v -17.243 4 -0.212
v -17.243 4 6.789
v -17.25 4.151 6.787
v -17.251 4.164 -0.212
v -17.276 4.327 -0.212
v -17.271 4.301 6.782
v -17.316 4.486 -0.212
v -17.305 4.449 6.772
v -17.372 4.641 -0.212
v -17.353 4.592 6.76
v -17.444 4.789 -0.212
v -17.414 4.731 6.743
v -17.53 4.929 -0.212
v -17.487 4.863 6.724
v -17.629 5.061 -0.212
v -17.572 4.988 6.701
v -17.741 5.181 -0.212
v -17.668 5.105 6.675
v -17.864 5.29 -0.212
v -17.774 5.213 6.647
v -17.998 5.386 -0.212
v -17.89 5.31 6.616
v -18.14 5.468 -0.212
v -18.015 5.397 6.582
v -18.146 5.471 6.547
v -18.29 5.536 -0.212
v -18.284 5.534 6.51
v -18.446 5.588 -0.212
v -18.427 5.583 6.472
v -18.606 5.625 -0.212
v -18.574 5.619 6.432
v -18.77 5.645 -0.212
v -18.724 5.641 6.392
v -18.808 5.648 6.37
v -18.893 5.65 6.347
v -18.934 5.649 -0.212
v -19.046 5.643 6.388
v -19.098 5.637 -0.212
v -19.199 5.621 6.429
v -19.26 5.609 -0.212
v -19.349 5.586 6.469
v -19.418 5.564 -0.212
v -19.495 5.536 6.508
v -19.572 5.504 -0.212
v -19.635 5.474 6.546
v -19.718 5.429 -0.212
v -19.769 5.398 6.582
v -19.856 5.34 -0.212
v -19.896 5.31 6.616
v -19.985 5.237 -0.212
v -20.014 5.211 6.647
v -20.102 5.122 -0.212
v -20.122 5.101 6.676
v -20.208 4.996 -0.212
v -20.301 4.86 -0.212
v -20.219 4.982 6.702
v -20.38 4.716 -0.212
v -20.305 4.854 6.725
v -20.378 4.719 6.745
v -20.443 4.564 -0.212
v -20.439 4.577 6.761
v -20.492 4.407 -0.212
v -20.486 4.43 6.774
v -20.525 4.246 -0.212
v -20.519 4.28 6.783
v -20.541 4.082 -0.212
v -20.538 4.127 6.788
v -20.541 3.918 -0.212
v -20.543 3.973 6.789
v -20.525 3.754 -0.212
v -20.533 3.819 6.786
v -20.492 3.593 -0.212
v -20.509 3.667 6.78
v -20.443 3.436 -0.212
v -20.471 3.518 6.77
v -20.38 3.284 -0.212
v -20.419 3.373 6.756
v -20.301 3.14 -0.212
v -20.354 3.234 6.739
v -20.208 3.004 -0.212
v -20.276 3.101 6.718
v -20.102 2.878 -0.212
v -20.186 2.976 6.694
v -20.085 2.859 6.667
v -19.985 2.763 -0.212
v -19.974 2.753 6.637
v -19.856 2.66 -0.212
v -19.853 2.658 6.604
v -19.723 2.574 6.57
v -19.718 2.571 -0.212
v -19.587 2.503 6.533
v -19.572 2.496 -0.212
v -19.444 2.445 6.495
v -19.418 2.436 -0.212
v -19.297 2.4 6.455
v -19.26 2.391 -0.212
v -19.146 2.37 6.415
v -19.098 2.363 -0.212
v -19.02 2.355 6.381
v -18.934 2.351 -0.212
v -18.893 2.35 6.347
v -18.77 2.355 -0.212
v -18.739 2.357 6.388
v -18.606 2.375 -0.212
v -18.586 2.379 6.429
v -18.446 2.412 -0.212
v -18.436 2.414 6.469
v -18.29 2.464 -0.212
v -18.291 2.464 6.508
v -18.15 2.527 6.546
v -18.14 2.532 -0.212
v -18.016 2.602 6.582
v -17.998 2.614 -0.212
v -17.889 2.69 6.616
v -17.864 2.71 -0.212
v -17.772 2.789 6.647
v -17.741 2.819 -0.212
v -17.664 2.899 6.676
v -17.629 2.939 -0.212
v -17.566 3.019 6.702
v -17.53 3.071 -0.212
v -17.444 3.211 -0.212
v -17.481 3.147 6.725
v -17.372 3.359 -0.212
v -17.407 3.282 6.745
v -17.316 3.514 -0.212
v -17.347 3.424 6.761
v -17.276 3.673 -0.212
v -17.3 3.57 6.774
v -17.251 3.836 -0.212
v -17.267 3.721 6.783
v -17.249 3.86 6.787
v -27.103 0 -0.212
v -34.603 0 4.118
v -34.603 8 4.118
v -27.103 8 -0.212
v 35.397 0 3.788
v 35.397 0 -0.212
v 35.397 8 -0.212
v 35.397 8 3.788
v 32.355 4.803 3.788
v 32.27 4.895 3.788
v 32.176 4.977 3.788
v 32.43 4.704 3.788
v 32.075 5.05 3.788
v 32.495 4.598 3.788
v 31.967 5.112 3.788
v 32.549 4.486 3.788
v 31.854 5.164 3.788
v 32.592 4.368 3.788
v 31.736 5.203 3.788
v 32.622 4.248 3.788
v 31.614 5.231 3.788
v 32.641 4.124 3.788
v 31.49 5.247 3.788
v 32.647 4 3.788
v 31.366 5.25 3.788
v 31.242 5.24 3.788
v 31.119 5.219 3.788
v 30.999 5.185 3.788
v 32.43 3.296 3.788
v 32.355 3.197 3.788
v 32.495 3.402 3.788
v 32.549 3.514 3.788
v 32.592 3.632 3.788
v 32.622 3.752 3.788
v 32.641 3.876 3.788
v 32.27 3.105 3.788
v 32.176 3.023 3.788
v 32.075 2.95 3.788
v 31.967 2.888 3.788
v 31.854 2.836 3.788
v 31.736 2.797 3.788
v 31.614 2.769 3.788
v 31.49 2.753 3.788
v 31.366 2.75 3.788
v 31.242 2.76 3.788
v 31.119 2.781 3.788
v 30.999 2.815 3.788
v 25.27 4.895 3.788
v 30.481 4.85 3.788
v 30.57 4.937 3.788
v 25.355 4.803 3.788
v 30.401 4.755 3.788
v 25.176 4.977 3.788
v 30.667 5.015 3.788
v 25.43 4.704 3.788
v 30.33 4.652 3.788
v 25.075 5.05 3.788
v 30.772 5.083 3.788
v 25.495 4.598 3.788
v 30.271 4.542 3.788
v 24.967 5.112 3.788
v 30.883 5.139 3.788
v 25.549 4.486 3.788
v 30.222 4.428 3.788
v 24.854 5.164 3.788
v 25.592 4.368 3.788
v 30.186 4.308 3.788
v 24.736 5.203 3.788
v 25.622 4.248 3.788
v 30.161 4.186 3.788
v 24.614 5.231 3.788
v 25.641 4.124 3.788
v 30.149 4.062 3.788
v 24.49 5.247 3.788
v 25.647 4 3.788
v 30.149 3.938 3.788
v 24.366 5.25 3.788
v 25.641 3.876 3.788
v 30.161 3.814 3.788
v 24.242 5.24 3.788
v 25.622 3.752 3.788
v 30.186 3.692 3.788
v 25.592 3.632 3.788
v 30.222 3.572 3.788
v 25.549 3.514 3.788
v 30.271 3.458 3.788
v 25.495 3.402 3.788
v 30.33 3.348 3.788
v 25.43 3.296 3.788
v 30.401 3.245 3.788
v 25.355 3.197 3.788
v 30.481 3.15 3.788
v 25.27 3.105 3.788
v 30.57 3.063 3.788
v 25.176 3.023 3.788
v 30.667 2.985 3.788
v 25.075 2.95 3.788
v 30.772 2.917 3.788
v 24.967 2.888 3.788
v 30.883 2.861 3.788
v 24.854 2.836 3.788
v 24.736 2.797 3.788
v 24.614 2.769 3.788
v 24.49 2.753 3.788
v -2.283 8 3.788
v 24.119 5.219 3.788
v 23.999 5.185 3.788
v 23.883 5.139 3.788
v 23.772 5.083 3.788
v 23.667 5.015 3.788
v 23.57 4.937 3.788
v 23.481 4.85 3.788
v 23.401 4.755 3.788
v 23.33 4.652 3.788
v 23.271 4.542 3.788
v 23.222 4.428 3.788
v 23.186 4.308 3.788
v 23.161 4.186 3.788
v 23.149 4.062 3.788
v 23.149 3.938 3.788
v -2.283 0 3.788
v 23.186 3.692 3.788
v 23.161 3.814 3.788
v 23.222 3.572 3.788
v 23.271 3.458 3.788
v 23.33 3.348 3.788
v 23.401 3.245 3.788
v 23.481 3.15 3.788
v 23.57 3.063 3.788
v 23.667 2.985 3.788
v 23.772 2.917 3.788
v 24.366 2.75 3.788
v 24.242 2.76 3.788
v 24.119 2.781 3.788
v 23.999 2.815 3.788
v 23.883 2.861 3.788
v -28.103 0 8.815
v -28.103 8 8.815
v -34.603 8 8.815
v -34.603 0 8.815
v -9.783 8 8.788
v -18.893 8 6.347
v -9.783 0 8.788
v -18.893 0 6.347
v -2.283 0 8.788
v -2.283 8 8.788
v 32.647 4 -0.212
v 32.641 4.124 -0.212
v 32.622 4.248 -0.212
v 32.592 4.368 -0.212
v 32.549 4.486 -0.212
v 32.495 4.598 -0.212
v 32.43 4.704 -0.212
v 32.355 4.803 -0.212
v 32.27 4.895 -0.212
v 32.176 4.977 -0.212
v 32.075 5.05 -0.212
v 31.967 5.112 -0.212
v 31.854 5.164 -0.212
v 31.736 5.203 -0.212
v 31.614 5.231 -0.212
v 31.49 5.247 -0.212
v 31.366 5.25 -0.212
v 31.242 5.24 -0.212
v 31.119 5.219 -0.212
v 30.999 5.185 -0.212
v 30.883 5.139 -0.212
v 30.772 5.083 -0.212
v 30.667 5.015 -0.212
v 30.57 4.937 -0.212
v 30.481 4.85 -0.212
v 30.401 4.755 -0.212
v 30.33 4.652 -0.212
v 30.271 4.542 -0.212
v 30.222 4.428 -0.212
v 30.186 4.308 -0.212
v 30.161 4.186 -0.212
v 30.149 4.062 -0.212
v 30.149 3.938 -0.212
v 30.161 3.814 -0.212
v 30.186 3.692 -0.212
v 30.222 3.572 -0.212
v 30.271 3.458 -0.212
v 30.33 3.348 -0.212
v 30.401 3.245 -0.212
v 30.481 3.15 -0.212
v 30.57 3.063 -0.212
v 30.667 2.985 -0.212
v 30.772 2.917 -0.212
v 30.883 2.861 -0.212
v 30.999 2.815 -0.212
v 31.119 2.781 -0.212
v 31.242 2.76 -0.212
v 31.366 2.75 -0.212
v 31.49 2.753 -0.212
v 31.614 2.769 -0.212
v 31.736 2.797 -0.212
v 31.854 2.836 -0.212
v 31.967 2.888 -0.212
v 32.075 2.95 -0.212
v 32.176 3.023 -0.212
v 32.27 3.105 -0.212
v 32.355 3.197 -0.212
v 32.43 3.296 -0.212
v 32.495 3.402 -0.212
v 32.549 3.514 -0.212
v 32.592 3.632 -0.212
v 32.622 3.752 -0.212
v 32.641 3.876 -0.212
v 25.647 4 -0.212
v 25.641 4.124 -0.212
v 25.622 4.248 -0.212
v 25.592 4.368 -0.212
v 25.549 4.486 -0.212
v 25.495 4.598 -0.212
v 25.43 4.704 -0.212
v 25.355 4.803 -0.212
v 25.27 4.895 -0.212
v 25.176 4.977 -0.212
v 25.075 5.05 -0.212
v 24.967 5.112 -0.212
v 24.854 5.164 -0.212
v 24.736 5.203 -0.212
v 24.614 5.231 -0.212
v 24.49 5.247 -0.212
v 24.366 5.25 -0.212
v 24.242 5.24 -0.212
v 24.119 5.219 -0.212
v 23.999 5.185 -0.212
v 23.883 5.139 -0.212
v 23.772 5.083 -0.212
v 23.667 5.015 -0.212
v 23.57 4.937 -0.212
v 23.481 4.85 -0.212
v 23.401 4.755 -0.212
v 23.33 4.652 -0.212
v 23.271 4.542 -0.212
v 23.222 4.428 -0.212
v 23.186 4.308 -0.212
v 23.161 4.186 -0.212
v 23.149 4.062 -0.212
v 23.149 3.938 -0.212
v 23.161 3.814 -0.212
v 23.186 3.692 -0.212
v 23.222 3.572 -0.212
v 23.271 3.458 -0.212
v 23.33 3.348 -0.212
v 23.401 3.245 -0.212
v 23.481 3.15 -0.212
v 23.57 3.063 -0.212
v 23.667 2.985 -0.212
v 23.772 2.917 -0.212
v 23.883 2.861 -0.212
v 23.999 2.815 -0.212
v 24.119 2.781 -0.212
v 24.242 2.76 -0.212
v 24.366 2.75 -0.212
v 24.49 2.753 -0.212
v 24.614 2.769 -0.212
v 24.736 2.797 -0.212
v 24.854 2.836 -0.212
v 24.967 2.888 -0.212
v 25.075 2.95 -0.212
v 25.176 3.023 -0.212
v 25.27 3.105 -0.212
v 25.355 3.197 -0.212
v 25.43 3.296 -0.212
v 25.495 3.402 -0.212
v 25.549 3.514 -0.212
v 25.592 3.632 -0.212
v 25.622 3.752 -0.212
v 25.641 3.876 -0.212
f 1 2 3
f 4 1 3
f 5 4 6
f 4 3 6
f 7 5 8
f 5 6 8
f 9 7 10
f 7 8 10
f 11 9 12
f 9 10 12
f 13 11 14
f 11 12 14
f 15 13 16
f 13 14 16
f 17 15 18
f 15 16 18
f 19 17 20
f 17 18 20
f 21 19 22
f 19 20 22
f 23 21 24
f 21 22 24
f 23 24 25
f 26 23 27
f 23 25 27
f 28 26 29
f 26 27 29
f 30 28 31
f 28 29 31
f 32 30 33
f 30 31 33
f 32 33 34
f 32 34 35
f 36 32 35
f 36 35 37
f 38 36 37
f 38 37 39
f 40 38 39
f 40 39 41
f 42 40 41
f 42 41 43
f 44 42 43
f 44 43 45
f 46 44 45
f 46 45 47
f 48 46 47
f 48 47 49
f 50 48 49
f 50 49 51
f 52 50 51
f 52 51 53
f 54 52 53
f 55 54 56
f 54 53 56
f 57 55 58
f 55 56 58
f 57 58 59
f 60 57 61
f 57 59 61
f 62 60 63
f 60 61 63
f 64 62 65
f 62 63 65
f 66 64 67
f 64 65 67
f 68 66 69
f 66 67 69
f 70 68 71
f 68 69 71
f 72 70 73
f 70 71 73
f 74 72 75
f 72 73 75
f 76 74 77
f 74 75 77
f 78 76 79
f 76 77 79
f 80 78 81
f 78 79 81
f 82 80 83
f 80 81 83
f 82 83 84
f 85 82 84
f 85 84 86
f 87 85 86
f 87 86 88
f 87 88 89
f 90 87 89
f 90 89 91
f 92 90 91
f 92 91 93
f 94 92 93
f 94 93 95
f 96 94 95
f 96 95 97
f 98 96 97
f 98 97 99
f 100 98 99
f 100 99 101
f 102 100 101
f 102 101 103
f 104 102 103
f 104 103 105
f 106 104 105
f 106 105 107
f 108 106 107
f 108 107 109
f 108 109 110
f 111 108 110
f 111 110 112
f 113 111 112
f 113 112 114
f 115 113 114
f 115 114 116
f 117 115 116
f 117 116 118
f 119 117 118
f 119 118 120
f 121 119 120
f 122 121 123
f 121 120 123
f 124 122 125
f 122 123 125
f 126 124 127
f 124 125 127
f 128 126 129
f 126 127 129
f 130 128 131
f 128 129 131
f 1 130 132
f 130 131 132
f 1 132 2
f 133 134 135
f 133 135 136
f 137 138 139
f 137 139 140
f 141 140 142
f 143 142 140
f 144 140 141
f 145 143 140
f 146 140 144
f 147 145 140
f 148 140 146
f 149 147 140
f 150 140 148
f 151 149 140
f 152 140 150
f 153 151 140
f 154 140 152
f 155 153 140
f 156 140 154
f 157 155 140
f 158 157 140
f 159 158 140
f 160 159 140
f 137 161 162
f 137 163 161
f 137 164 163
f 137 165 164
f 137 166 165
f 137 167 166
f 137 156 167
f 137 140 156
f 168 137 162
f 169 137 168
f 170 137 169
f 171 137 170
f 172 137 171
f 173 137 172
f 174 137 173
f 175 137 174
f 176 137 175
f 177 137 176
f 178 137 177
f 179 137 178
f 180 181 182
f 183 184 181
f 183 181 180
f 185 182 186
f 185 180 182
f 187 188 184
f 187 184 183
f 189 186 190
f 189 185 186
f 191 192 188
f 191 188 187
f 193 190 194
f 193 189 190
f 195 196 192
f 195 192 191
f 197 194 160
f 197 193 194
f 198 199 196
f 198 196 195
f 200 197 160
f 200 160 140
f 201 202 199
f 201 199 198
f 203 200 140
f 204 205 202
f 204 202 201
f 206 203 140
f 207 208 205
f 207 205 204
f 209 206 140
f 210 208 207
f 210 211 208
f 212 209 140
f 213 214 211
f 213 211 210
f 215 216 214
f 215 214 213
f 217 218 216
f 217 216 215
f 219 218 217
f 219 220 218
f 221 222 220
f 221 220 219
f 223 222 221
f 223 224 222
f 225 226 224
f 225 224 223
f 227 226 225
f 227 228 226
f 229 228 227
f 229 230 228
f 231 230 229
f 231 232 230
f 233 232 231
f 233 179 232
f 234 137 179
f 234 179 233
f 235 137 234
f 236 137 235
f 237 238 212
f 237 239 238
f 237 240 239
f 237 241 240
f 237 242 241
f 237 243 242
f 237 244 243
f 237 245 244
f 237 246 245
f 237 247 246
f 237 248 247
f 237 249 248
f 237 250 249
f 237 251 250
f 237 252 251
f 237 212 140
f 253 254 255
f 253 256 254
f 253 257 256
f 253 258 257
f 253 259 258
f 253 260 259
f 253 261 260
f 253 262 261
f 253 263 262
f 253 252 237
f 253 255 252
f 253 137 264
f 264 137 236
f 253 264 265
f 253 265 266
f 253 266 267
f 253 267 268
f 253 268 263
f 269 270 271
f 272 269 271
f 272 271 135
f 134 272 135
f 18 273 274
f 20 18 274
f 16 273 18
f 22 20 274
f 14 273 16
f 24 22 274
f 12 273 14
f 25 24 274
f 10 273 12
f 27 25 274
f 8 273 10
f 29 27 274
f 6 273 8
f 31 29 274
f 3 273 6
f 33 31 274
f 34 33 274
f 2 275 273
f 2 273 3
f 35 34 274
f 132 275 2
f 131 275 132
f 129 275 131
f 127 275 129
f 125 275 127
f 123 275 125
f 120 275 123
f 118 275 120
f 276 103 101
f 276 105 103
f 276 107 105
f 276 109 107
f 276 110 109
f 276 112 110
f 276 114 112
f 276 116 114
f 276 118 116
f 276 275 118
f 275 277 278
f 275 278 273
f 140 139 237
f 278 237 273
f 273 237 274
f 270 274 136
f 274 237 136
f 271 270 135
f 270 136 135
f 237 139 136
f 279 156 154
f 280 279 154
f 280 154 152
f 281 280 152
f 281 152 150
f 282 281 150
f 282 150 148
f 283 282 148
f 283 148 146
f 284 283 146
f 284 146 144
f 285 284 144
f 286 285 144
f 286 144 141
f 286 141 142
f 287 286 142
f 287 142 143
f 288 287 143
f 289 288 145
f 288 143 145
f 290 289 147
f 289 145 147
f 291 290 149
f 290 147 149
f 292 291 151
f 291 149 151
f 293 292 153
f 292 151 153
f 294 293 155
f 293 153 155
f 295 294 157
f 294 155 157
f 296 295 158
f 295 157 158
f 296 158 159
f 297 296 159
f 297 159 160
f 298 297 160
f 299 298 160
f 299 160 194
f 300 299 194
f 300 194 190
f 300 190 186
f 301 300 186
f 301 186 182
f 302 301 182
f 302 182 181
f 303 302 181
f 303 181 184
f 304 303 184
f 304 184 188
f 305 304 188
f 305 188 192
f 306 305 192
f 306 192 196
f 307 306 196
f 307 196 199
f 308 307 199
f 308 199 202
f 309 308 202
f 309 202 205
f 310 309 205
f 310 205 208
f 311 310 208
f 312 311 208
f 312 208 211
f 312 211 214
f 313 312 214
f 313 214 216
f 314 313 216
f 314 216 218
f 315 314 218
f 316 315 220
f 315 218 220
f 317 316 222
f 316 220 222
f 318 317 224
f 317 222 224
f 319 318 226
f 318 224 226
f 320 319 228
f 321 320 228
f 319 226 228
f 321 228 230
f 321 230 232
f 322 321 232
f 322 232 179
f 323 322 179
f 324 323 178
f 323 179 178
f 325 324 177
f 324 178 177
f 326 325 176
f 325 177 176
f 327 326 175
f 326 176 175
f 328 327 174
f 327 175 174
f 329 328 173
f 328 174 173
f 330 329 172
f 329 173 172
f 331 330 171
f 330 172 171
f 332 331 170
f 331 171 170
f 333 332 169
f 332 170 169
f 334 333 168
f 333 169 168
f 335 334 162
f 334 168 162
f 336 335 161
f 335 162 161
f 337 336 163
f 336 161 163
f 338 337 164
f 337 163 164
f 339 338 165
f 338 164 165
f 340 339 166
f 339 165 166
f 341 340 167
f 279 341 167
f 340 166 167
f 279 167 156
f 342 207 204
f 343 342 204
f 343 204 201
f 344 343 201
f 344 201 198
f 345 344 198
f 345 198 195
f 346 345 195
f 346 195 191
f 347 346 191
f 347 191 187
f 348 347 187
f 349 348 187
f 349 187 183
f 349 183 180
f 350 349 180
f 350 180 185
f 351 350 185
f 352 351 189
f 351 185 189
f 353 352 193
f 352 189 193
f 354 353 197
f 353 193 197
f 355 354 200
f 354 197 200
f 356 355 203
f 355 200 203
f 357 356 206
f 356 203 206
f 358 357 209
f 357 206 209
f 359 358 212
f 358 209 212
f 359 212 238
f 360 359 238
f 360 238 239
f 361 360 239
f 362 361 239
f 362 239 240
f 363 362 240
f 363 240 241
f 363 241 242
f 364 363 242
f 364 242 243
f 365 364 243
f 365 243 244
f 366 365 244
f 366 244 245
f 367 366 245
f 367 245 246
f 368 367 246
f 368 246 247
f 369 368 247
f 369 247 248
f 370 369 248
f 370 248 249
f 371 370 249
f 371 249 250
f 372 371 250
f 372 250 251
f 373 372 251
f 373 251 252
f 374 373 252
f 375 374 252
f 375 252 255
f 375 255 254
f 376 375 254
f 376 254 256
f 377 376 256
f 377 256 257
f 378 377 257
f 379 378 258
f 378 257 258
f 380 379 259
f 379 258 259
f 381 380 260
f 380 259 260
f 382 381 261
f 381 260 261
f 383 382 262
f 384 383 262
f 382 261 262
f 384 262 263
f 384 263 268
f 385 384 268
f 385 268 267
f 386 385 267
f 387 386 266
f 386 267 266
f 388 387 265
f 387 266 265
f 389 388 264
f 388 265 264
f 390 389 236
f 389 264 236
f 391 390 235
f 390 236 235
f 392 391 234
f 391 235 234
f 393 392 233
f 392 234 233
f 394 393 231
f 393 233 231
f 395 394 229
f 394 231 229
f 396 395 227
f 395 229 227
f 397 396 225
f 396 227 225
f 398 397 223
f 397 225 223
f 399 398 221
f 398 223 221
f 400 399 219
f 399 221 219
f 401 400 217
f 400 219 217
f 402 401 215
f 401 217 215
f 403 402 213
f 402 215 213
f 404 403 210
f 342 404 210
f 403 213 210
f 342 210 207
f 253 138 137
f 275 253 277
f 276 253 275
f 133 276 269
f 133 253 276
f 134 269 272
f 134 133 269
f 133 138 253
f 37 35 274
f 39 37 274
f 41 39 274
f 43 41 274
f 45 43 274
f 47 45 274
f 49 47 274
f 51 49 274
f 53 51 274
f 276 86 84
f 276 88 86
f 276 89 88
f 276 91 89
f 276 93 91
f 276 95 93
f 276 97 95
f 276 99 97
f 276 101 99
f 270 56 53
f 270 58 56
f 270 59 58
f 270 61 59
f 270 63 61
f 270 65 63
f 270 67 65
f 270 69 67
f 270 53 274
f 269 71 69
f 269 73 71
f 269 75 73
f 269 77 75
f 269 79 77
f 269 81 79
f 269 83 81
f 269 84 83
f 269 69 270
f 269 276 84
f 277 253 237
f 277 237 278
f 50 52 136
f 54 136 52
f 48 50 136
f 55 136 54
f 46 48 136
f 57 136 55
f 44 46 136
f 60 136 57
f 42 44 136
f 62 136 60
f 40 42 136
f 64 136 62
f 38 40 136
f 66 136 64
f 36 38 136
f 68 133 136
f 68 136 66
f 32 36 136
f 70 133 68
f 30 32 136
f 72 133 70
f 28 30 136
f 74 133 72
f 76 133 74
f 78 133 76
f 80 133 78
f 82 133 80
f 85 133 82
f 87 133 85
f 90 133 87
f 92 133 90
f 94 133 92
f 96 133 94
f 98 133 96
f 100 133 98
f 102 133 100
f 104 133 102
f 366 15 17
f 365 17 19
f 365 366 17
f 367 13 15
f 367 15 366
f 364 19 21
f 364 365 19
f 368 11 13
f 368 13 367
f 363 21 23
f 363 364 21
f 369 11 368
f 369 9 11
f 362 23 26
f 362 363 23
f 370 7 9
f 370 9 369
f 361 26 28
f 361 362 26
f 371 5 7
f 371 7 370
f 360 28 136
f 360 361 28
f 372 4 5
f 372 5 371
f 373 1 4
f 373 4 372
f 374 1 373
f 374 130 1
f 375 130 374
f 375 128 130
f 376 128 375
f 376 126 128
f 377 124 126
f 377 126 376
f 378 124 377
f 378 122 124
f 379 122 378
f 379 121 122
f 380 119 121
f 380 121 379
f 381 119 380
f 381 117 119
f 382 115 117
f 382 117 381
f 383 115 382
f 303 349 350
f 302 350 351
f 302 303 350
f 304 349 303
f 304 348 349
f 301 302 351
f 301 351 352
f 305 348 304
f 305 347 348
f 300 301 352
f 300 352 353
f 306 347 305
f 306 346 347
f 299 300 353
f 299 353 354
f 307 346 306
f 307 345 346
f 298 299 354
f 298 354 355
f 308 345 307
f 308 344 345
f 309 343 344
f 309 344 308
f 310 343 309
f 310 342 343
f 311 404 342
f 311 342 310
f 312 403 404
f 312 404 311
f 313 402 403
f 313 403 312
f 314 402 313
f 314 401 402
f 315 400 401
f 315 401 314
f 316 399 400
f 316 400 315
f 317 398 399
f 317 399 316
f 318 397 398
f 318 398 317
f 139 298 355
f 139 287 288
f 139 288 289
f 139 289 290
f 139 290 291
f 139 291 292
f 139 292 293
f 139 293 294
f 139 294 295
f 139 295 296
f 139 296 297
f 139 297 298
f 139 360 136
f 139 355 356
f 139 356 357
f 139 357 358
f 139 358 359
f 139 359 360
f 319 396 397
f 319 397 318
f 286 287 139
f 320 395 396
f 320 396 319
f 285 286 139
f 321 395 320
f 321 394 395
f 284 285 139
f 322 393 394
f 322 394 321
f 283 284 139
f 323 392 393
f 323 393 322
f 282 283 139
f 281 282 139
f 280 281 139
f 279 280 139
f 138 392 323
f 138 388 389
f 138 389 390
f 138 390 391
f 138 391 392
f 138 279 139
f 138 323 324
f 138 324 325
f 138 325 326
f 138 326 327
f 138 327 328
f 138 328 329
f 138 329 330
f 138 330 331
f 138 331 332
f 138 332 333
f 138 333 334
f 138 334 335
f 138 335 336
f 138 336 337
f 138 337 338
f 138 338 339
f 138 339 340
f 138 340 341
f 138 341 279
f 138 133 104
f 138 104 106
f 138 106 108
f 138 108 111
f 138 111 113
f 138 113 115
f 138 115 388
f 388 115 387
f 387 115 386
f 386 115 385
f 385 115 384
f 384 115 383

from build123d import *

# Parameters (mm, degrees)
BOSS_EXTRUDE2_DEPTH   = 8
M3_TAPPED_HOLE1_D     = 2.5
M3_TAPPED_HOLE1_DEPTH = 8.5
M3_TAPPED_HOLE1_TIP   = 0.751075774
M4_TAPPED_HOLE1_D     = 3.3
M4_TAPPED_HOLE1_DEPTH = 11.5
M4_TAPPED_HOLE1_TIP   = 0.991420021


with BuildPart() as part:
    # Sketch1 → Boss-Extrude2 (new body)
    with BuildSketch(Plane(origin=(0, 0, 0), x_dir=(1, 0, 0), z_dir=(0, 1, 0))):
        Polygon((35.397046685, 0.212206196), (35.397046685, -3.787793804), (-2.283249607, -3.787793804), (-2.283249607, -8.787793804), (-9.783249607, -8.787793804), (-18.892613672, -6.346947059), (-28.102933344, -8.814844777), (-34.602933344, -8.814844777), (-34.602933344, -4.117707659), (-27.103302555, 0.212206196), align=None)
    extrude(amount=BOSS_EXTRUDE2_DEPTH)

    # M3 Tapped Hole1
    with Locations(Plane(origin=(0, 0, -0.212206196), x_dir=(-1, 0, 0), z_dir=(0, 0, -1))):
        with Locations((-31.397046685, 4), (-24.397046685, 4)):
            Hole(M3_TAPPED_HOLE1_D / 2, depth=M3_TAPPED_HOLE1_DEPTH)
            with Locations((0, 0, -(M3_TAPPED_HOLE1_DEPTH + M3_TAPPED_HOLE1_TIP / 2))):  # 118° drill point
                Cone(0, M3_TAPPED_HOLE1_D / 2, M3_TAPPED_HOLE1_TIP, mode=Mode.SUBTRACT)

    # M4 Tapped Hole1
    with Locations(Plane(origin=(0, 0, -0.212206196), x_dir=(-1, 0, 0), z_dir=(0, 0, -1))):
        with Locations((18.892933344, 4)):
            Hole(M4_TAPPED_HOLE1_D / 2, depth=M4_TAPPED_HOLE1_DEPTH)
            with Locations((0, 0, -(M4_TAPPED_HOLE1_DEPTH + M4_TAPPED_HOLE1_TIP / 2))):  # 118° drill point
                Cone(0, M4_TAPPED_HOLE1_D / 2, M4_TAPPED_HOLE1_TIP, mode=Mode.SUBTRACT)


solid = part.part
